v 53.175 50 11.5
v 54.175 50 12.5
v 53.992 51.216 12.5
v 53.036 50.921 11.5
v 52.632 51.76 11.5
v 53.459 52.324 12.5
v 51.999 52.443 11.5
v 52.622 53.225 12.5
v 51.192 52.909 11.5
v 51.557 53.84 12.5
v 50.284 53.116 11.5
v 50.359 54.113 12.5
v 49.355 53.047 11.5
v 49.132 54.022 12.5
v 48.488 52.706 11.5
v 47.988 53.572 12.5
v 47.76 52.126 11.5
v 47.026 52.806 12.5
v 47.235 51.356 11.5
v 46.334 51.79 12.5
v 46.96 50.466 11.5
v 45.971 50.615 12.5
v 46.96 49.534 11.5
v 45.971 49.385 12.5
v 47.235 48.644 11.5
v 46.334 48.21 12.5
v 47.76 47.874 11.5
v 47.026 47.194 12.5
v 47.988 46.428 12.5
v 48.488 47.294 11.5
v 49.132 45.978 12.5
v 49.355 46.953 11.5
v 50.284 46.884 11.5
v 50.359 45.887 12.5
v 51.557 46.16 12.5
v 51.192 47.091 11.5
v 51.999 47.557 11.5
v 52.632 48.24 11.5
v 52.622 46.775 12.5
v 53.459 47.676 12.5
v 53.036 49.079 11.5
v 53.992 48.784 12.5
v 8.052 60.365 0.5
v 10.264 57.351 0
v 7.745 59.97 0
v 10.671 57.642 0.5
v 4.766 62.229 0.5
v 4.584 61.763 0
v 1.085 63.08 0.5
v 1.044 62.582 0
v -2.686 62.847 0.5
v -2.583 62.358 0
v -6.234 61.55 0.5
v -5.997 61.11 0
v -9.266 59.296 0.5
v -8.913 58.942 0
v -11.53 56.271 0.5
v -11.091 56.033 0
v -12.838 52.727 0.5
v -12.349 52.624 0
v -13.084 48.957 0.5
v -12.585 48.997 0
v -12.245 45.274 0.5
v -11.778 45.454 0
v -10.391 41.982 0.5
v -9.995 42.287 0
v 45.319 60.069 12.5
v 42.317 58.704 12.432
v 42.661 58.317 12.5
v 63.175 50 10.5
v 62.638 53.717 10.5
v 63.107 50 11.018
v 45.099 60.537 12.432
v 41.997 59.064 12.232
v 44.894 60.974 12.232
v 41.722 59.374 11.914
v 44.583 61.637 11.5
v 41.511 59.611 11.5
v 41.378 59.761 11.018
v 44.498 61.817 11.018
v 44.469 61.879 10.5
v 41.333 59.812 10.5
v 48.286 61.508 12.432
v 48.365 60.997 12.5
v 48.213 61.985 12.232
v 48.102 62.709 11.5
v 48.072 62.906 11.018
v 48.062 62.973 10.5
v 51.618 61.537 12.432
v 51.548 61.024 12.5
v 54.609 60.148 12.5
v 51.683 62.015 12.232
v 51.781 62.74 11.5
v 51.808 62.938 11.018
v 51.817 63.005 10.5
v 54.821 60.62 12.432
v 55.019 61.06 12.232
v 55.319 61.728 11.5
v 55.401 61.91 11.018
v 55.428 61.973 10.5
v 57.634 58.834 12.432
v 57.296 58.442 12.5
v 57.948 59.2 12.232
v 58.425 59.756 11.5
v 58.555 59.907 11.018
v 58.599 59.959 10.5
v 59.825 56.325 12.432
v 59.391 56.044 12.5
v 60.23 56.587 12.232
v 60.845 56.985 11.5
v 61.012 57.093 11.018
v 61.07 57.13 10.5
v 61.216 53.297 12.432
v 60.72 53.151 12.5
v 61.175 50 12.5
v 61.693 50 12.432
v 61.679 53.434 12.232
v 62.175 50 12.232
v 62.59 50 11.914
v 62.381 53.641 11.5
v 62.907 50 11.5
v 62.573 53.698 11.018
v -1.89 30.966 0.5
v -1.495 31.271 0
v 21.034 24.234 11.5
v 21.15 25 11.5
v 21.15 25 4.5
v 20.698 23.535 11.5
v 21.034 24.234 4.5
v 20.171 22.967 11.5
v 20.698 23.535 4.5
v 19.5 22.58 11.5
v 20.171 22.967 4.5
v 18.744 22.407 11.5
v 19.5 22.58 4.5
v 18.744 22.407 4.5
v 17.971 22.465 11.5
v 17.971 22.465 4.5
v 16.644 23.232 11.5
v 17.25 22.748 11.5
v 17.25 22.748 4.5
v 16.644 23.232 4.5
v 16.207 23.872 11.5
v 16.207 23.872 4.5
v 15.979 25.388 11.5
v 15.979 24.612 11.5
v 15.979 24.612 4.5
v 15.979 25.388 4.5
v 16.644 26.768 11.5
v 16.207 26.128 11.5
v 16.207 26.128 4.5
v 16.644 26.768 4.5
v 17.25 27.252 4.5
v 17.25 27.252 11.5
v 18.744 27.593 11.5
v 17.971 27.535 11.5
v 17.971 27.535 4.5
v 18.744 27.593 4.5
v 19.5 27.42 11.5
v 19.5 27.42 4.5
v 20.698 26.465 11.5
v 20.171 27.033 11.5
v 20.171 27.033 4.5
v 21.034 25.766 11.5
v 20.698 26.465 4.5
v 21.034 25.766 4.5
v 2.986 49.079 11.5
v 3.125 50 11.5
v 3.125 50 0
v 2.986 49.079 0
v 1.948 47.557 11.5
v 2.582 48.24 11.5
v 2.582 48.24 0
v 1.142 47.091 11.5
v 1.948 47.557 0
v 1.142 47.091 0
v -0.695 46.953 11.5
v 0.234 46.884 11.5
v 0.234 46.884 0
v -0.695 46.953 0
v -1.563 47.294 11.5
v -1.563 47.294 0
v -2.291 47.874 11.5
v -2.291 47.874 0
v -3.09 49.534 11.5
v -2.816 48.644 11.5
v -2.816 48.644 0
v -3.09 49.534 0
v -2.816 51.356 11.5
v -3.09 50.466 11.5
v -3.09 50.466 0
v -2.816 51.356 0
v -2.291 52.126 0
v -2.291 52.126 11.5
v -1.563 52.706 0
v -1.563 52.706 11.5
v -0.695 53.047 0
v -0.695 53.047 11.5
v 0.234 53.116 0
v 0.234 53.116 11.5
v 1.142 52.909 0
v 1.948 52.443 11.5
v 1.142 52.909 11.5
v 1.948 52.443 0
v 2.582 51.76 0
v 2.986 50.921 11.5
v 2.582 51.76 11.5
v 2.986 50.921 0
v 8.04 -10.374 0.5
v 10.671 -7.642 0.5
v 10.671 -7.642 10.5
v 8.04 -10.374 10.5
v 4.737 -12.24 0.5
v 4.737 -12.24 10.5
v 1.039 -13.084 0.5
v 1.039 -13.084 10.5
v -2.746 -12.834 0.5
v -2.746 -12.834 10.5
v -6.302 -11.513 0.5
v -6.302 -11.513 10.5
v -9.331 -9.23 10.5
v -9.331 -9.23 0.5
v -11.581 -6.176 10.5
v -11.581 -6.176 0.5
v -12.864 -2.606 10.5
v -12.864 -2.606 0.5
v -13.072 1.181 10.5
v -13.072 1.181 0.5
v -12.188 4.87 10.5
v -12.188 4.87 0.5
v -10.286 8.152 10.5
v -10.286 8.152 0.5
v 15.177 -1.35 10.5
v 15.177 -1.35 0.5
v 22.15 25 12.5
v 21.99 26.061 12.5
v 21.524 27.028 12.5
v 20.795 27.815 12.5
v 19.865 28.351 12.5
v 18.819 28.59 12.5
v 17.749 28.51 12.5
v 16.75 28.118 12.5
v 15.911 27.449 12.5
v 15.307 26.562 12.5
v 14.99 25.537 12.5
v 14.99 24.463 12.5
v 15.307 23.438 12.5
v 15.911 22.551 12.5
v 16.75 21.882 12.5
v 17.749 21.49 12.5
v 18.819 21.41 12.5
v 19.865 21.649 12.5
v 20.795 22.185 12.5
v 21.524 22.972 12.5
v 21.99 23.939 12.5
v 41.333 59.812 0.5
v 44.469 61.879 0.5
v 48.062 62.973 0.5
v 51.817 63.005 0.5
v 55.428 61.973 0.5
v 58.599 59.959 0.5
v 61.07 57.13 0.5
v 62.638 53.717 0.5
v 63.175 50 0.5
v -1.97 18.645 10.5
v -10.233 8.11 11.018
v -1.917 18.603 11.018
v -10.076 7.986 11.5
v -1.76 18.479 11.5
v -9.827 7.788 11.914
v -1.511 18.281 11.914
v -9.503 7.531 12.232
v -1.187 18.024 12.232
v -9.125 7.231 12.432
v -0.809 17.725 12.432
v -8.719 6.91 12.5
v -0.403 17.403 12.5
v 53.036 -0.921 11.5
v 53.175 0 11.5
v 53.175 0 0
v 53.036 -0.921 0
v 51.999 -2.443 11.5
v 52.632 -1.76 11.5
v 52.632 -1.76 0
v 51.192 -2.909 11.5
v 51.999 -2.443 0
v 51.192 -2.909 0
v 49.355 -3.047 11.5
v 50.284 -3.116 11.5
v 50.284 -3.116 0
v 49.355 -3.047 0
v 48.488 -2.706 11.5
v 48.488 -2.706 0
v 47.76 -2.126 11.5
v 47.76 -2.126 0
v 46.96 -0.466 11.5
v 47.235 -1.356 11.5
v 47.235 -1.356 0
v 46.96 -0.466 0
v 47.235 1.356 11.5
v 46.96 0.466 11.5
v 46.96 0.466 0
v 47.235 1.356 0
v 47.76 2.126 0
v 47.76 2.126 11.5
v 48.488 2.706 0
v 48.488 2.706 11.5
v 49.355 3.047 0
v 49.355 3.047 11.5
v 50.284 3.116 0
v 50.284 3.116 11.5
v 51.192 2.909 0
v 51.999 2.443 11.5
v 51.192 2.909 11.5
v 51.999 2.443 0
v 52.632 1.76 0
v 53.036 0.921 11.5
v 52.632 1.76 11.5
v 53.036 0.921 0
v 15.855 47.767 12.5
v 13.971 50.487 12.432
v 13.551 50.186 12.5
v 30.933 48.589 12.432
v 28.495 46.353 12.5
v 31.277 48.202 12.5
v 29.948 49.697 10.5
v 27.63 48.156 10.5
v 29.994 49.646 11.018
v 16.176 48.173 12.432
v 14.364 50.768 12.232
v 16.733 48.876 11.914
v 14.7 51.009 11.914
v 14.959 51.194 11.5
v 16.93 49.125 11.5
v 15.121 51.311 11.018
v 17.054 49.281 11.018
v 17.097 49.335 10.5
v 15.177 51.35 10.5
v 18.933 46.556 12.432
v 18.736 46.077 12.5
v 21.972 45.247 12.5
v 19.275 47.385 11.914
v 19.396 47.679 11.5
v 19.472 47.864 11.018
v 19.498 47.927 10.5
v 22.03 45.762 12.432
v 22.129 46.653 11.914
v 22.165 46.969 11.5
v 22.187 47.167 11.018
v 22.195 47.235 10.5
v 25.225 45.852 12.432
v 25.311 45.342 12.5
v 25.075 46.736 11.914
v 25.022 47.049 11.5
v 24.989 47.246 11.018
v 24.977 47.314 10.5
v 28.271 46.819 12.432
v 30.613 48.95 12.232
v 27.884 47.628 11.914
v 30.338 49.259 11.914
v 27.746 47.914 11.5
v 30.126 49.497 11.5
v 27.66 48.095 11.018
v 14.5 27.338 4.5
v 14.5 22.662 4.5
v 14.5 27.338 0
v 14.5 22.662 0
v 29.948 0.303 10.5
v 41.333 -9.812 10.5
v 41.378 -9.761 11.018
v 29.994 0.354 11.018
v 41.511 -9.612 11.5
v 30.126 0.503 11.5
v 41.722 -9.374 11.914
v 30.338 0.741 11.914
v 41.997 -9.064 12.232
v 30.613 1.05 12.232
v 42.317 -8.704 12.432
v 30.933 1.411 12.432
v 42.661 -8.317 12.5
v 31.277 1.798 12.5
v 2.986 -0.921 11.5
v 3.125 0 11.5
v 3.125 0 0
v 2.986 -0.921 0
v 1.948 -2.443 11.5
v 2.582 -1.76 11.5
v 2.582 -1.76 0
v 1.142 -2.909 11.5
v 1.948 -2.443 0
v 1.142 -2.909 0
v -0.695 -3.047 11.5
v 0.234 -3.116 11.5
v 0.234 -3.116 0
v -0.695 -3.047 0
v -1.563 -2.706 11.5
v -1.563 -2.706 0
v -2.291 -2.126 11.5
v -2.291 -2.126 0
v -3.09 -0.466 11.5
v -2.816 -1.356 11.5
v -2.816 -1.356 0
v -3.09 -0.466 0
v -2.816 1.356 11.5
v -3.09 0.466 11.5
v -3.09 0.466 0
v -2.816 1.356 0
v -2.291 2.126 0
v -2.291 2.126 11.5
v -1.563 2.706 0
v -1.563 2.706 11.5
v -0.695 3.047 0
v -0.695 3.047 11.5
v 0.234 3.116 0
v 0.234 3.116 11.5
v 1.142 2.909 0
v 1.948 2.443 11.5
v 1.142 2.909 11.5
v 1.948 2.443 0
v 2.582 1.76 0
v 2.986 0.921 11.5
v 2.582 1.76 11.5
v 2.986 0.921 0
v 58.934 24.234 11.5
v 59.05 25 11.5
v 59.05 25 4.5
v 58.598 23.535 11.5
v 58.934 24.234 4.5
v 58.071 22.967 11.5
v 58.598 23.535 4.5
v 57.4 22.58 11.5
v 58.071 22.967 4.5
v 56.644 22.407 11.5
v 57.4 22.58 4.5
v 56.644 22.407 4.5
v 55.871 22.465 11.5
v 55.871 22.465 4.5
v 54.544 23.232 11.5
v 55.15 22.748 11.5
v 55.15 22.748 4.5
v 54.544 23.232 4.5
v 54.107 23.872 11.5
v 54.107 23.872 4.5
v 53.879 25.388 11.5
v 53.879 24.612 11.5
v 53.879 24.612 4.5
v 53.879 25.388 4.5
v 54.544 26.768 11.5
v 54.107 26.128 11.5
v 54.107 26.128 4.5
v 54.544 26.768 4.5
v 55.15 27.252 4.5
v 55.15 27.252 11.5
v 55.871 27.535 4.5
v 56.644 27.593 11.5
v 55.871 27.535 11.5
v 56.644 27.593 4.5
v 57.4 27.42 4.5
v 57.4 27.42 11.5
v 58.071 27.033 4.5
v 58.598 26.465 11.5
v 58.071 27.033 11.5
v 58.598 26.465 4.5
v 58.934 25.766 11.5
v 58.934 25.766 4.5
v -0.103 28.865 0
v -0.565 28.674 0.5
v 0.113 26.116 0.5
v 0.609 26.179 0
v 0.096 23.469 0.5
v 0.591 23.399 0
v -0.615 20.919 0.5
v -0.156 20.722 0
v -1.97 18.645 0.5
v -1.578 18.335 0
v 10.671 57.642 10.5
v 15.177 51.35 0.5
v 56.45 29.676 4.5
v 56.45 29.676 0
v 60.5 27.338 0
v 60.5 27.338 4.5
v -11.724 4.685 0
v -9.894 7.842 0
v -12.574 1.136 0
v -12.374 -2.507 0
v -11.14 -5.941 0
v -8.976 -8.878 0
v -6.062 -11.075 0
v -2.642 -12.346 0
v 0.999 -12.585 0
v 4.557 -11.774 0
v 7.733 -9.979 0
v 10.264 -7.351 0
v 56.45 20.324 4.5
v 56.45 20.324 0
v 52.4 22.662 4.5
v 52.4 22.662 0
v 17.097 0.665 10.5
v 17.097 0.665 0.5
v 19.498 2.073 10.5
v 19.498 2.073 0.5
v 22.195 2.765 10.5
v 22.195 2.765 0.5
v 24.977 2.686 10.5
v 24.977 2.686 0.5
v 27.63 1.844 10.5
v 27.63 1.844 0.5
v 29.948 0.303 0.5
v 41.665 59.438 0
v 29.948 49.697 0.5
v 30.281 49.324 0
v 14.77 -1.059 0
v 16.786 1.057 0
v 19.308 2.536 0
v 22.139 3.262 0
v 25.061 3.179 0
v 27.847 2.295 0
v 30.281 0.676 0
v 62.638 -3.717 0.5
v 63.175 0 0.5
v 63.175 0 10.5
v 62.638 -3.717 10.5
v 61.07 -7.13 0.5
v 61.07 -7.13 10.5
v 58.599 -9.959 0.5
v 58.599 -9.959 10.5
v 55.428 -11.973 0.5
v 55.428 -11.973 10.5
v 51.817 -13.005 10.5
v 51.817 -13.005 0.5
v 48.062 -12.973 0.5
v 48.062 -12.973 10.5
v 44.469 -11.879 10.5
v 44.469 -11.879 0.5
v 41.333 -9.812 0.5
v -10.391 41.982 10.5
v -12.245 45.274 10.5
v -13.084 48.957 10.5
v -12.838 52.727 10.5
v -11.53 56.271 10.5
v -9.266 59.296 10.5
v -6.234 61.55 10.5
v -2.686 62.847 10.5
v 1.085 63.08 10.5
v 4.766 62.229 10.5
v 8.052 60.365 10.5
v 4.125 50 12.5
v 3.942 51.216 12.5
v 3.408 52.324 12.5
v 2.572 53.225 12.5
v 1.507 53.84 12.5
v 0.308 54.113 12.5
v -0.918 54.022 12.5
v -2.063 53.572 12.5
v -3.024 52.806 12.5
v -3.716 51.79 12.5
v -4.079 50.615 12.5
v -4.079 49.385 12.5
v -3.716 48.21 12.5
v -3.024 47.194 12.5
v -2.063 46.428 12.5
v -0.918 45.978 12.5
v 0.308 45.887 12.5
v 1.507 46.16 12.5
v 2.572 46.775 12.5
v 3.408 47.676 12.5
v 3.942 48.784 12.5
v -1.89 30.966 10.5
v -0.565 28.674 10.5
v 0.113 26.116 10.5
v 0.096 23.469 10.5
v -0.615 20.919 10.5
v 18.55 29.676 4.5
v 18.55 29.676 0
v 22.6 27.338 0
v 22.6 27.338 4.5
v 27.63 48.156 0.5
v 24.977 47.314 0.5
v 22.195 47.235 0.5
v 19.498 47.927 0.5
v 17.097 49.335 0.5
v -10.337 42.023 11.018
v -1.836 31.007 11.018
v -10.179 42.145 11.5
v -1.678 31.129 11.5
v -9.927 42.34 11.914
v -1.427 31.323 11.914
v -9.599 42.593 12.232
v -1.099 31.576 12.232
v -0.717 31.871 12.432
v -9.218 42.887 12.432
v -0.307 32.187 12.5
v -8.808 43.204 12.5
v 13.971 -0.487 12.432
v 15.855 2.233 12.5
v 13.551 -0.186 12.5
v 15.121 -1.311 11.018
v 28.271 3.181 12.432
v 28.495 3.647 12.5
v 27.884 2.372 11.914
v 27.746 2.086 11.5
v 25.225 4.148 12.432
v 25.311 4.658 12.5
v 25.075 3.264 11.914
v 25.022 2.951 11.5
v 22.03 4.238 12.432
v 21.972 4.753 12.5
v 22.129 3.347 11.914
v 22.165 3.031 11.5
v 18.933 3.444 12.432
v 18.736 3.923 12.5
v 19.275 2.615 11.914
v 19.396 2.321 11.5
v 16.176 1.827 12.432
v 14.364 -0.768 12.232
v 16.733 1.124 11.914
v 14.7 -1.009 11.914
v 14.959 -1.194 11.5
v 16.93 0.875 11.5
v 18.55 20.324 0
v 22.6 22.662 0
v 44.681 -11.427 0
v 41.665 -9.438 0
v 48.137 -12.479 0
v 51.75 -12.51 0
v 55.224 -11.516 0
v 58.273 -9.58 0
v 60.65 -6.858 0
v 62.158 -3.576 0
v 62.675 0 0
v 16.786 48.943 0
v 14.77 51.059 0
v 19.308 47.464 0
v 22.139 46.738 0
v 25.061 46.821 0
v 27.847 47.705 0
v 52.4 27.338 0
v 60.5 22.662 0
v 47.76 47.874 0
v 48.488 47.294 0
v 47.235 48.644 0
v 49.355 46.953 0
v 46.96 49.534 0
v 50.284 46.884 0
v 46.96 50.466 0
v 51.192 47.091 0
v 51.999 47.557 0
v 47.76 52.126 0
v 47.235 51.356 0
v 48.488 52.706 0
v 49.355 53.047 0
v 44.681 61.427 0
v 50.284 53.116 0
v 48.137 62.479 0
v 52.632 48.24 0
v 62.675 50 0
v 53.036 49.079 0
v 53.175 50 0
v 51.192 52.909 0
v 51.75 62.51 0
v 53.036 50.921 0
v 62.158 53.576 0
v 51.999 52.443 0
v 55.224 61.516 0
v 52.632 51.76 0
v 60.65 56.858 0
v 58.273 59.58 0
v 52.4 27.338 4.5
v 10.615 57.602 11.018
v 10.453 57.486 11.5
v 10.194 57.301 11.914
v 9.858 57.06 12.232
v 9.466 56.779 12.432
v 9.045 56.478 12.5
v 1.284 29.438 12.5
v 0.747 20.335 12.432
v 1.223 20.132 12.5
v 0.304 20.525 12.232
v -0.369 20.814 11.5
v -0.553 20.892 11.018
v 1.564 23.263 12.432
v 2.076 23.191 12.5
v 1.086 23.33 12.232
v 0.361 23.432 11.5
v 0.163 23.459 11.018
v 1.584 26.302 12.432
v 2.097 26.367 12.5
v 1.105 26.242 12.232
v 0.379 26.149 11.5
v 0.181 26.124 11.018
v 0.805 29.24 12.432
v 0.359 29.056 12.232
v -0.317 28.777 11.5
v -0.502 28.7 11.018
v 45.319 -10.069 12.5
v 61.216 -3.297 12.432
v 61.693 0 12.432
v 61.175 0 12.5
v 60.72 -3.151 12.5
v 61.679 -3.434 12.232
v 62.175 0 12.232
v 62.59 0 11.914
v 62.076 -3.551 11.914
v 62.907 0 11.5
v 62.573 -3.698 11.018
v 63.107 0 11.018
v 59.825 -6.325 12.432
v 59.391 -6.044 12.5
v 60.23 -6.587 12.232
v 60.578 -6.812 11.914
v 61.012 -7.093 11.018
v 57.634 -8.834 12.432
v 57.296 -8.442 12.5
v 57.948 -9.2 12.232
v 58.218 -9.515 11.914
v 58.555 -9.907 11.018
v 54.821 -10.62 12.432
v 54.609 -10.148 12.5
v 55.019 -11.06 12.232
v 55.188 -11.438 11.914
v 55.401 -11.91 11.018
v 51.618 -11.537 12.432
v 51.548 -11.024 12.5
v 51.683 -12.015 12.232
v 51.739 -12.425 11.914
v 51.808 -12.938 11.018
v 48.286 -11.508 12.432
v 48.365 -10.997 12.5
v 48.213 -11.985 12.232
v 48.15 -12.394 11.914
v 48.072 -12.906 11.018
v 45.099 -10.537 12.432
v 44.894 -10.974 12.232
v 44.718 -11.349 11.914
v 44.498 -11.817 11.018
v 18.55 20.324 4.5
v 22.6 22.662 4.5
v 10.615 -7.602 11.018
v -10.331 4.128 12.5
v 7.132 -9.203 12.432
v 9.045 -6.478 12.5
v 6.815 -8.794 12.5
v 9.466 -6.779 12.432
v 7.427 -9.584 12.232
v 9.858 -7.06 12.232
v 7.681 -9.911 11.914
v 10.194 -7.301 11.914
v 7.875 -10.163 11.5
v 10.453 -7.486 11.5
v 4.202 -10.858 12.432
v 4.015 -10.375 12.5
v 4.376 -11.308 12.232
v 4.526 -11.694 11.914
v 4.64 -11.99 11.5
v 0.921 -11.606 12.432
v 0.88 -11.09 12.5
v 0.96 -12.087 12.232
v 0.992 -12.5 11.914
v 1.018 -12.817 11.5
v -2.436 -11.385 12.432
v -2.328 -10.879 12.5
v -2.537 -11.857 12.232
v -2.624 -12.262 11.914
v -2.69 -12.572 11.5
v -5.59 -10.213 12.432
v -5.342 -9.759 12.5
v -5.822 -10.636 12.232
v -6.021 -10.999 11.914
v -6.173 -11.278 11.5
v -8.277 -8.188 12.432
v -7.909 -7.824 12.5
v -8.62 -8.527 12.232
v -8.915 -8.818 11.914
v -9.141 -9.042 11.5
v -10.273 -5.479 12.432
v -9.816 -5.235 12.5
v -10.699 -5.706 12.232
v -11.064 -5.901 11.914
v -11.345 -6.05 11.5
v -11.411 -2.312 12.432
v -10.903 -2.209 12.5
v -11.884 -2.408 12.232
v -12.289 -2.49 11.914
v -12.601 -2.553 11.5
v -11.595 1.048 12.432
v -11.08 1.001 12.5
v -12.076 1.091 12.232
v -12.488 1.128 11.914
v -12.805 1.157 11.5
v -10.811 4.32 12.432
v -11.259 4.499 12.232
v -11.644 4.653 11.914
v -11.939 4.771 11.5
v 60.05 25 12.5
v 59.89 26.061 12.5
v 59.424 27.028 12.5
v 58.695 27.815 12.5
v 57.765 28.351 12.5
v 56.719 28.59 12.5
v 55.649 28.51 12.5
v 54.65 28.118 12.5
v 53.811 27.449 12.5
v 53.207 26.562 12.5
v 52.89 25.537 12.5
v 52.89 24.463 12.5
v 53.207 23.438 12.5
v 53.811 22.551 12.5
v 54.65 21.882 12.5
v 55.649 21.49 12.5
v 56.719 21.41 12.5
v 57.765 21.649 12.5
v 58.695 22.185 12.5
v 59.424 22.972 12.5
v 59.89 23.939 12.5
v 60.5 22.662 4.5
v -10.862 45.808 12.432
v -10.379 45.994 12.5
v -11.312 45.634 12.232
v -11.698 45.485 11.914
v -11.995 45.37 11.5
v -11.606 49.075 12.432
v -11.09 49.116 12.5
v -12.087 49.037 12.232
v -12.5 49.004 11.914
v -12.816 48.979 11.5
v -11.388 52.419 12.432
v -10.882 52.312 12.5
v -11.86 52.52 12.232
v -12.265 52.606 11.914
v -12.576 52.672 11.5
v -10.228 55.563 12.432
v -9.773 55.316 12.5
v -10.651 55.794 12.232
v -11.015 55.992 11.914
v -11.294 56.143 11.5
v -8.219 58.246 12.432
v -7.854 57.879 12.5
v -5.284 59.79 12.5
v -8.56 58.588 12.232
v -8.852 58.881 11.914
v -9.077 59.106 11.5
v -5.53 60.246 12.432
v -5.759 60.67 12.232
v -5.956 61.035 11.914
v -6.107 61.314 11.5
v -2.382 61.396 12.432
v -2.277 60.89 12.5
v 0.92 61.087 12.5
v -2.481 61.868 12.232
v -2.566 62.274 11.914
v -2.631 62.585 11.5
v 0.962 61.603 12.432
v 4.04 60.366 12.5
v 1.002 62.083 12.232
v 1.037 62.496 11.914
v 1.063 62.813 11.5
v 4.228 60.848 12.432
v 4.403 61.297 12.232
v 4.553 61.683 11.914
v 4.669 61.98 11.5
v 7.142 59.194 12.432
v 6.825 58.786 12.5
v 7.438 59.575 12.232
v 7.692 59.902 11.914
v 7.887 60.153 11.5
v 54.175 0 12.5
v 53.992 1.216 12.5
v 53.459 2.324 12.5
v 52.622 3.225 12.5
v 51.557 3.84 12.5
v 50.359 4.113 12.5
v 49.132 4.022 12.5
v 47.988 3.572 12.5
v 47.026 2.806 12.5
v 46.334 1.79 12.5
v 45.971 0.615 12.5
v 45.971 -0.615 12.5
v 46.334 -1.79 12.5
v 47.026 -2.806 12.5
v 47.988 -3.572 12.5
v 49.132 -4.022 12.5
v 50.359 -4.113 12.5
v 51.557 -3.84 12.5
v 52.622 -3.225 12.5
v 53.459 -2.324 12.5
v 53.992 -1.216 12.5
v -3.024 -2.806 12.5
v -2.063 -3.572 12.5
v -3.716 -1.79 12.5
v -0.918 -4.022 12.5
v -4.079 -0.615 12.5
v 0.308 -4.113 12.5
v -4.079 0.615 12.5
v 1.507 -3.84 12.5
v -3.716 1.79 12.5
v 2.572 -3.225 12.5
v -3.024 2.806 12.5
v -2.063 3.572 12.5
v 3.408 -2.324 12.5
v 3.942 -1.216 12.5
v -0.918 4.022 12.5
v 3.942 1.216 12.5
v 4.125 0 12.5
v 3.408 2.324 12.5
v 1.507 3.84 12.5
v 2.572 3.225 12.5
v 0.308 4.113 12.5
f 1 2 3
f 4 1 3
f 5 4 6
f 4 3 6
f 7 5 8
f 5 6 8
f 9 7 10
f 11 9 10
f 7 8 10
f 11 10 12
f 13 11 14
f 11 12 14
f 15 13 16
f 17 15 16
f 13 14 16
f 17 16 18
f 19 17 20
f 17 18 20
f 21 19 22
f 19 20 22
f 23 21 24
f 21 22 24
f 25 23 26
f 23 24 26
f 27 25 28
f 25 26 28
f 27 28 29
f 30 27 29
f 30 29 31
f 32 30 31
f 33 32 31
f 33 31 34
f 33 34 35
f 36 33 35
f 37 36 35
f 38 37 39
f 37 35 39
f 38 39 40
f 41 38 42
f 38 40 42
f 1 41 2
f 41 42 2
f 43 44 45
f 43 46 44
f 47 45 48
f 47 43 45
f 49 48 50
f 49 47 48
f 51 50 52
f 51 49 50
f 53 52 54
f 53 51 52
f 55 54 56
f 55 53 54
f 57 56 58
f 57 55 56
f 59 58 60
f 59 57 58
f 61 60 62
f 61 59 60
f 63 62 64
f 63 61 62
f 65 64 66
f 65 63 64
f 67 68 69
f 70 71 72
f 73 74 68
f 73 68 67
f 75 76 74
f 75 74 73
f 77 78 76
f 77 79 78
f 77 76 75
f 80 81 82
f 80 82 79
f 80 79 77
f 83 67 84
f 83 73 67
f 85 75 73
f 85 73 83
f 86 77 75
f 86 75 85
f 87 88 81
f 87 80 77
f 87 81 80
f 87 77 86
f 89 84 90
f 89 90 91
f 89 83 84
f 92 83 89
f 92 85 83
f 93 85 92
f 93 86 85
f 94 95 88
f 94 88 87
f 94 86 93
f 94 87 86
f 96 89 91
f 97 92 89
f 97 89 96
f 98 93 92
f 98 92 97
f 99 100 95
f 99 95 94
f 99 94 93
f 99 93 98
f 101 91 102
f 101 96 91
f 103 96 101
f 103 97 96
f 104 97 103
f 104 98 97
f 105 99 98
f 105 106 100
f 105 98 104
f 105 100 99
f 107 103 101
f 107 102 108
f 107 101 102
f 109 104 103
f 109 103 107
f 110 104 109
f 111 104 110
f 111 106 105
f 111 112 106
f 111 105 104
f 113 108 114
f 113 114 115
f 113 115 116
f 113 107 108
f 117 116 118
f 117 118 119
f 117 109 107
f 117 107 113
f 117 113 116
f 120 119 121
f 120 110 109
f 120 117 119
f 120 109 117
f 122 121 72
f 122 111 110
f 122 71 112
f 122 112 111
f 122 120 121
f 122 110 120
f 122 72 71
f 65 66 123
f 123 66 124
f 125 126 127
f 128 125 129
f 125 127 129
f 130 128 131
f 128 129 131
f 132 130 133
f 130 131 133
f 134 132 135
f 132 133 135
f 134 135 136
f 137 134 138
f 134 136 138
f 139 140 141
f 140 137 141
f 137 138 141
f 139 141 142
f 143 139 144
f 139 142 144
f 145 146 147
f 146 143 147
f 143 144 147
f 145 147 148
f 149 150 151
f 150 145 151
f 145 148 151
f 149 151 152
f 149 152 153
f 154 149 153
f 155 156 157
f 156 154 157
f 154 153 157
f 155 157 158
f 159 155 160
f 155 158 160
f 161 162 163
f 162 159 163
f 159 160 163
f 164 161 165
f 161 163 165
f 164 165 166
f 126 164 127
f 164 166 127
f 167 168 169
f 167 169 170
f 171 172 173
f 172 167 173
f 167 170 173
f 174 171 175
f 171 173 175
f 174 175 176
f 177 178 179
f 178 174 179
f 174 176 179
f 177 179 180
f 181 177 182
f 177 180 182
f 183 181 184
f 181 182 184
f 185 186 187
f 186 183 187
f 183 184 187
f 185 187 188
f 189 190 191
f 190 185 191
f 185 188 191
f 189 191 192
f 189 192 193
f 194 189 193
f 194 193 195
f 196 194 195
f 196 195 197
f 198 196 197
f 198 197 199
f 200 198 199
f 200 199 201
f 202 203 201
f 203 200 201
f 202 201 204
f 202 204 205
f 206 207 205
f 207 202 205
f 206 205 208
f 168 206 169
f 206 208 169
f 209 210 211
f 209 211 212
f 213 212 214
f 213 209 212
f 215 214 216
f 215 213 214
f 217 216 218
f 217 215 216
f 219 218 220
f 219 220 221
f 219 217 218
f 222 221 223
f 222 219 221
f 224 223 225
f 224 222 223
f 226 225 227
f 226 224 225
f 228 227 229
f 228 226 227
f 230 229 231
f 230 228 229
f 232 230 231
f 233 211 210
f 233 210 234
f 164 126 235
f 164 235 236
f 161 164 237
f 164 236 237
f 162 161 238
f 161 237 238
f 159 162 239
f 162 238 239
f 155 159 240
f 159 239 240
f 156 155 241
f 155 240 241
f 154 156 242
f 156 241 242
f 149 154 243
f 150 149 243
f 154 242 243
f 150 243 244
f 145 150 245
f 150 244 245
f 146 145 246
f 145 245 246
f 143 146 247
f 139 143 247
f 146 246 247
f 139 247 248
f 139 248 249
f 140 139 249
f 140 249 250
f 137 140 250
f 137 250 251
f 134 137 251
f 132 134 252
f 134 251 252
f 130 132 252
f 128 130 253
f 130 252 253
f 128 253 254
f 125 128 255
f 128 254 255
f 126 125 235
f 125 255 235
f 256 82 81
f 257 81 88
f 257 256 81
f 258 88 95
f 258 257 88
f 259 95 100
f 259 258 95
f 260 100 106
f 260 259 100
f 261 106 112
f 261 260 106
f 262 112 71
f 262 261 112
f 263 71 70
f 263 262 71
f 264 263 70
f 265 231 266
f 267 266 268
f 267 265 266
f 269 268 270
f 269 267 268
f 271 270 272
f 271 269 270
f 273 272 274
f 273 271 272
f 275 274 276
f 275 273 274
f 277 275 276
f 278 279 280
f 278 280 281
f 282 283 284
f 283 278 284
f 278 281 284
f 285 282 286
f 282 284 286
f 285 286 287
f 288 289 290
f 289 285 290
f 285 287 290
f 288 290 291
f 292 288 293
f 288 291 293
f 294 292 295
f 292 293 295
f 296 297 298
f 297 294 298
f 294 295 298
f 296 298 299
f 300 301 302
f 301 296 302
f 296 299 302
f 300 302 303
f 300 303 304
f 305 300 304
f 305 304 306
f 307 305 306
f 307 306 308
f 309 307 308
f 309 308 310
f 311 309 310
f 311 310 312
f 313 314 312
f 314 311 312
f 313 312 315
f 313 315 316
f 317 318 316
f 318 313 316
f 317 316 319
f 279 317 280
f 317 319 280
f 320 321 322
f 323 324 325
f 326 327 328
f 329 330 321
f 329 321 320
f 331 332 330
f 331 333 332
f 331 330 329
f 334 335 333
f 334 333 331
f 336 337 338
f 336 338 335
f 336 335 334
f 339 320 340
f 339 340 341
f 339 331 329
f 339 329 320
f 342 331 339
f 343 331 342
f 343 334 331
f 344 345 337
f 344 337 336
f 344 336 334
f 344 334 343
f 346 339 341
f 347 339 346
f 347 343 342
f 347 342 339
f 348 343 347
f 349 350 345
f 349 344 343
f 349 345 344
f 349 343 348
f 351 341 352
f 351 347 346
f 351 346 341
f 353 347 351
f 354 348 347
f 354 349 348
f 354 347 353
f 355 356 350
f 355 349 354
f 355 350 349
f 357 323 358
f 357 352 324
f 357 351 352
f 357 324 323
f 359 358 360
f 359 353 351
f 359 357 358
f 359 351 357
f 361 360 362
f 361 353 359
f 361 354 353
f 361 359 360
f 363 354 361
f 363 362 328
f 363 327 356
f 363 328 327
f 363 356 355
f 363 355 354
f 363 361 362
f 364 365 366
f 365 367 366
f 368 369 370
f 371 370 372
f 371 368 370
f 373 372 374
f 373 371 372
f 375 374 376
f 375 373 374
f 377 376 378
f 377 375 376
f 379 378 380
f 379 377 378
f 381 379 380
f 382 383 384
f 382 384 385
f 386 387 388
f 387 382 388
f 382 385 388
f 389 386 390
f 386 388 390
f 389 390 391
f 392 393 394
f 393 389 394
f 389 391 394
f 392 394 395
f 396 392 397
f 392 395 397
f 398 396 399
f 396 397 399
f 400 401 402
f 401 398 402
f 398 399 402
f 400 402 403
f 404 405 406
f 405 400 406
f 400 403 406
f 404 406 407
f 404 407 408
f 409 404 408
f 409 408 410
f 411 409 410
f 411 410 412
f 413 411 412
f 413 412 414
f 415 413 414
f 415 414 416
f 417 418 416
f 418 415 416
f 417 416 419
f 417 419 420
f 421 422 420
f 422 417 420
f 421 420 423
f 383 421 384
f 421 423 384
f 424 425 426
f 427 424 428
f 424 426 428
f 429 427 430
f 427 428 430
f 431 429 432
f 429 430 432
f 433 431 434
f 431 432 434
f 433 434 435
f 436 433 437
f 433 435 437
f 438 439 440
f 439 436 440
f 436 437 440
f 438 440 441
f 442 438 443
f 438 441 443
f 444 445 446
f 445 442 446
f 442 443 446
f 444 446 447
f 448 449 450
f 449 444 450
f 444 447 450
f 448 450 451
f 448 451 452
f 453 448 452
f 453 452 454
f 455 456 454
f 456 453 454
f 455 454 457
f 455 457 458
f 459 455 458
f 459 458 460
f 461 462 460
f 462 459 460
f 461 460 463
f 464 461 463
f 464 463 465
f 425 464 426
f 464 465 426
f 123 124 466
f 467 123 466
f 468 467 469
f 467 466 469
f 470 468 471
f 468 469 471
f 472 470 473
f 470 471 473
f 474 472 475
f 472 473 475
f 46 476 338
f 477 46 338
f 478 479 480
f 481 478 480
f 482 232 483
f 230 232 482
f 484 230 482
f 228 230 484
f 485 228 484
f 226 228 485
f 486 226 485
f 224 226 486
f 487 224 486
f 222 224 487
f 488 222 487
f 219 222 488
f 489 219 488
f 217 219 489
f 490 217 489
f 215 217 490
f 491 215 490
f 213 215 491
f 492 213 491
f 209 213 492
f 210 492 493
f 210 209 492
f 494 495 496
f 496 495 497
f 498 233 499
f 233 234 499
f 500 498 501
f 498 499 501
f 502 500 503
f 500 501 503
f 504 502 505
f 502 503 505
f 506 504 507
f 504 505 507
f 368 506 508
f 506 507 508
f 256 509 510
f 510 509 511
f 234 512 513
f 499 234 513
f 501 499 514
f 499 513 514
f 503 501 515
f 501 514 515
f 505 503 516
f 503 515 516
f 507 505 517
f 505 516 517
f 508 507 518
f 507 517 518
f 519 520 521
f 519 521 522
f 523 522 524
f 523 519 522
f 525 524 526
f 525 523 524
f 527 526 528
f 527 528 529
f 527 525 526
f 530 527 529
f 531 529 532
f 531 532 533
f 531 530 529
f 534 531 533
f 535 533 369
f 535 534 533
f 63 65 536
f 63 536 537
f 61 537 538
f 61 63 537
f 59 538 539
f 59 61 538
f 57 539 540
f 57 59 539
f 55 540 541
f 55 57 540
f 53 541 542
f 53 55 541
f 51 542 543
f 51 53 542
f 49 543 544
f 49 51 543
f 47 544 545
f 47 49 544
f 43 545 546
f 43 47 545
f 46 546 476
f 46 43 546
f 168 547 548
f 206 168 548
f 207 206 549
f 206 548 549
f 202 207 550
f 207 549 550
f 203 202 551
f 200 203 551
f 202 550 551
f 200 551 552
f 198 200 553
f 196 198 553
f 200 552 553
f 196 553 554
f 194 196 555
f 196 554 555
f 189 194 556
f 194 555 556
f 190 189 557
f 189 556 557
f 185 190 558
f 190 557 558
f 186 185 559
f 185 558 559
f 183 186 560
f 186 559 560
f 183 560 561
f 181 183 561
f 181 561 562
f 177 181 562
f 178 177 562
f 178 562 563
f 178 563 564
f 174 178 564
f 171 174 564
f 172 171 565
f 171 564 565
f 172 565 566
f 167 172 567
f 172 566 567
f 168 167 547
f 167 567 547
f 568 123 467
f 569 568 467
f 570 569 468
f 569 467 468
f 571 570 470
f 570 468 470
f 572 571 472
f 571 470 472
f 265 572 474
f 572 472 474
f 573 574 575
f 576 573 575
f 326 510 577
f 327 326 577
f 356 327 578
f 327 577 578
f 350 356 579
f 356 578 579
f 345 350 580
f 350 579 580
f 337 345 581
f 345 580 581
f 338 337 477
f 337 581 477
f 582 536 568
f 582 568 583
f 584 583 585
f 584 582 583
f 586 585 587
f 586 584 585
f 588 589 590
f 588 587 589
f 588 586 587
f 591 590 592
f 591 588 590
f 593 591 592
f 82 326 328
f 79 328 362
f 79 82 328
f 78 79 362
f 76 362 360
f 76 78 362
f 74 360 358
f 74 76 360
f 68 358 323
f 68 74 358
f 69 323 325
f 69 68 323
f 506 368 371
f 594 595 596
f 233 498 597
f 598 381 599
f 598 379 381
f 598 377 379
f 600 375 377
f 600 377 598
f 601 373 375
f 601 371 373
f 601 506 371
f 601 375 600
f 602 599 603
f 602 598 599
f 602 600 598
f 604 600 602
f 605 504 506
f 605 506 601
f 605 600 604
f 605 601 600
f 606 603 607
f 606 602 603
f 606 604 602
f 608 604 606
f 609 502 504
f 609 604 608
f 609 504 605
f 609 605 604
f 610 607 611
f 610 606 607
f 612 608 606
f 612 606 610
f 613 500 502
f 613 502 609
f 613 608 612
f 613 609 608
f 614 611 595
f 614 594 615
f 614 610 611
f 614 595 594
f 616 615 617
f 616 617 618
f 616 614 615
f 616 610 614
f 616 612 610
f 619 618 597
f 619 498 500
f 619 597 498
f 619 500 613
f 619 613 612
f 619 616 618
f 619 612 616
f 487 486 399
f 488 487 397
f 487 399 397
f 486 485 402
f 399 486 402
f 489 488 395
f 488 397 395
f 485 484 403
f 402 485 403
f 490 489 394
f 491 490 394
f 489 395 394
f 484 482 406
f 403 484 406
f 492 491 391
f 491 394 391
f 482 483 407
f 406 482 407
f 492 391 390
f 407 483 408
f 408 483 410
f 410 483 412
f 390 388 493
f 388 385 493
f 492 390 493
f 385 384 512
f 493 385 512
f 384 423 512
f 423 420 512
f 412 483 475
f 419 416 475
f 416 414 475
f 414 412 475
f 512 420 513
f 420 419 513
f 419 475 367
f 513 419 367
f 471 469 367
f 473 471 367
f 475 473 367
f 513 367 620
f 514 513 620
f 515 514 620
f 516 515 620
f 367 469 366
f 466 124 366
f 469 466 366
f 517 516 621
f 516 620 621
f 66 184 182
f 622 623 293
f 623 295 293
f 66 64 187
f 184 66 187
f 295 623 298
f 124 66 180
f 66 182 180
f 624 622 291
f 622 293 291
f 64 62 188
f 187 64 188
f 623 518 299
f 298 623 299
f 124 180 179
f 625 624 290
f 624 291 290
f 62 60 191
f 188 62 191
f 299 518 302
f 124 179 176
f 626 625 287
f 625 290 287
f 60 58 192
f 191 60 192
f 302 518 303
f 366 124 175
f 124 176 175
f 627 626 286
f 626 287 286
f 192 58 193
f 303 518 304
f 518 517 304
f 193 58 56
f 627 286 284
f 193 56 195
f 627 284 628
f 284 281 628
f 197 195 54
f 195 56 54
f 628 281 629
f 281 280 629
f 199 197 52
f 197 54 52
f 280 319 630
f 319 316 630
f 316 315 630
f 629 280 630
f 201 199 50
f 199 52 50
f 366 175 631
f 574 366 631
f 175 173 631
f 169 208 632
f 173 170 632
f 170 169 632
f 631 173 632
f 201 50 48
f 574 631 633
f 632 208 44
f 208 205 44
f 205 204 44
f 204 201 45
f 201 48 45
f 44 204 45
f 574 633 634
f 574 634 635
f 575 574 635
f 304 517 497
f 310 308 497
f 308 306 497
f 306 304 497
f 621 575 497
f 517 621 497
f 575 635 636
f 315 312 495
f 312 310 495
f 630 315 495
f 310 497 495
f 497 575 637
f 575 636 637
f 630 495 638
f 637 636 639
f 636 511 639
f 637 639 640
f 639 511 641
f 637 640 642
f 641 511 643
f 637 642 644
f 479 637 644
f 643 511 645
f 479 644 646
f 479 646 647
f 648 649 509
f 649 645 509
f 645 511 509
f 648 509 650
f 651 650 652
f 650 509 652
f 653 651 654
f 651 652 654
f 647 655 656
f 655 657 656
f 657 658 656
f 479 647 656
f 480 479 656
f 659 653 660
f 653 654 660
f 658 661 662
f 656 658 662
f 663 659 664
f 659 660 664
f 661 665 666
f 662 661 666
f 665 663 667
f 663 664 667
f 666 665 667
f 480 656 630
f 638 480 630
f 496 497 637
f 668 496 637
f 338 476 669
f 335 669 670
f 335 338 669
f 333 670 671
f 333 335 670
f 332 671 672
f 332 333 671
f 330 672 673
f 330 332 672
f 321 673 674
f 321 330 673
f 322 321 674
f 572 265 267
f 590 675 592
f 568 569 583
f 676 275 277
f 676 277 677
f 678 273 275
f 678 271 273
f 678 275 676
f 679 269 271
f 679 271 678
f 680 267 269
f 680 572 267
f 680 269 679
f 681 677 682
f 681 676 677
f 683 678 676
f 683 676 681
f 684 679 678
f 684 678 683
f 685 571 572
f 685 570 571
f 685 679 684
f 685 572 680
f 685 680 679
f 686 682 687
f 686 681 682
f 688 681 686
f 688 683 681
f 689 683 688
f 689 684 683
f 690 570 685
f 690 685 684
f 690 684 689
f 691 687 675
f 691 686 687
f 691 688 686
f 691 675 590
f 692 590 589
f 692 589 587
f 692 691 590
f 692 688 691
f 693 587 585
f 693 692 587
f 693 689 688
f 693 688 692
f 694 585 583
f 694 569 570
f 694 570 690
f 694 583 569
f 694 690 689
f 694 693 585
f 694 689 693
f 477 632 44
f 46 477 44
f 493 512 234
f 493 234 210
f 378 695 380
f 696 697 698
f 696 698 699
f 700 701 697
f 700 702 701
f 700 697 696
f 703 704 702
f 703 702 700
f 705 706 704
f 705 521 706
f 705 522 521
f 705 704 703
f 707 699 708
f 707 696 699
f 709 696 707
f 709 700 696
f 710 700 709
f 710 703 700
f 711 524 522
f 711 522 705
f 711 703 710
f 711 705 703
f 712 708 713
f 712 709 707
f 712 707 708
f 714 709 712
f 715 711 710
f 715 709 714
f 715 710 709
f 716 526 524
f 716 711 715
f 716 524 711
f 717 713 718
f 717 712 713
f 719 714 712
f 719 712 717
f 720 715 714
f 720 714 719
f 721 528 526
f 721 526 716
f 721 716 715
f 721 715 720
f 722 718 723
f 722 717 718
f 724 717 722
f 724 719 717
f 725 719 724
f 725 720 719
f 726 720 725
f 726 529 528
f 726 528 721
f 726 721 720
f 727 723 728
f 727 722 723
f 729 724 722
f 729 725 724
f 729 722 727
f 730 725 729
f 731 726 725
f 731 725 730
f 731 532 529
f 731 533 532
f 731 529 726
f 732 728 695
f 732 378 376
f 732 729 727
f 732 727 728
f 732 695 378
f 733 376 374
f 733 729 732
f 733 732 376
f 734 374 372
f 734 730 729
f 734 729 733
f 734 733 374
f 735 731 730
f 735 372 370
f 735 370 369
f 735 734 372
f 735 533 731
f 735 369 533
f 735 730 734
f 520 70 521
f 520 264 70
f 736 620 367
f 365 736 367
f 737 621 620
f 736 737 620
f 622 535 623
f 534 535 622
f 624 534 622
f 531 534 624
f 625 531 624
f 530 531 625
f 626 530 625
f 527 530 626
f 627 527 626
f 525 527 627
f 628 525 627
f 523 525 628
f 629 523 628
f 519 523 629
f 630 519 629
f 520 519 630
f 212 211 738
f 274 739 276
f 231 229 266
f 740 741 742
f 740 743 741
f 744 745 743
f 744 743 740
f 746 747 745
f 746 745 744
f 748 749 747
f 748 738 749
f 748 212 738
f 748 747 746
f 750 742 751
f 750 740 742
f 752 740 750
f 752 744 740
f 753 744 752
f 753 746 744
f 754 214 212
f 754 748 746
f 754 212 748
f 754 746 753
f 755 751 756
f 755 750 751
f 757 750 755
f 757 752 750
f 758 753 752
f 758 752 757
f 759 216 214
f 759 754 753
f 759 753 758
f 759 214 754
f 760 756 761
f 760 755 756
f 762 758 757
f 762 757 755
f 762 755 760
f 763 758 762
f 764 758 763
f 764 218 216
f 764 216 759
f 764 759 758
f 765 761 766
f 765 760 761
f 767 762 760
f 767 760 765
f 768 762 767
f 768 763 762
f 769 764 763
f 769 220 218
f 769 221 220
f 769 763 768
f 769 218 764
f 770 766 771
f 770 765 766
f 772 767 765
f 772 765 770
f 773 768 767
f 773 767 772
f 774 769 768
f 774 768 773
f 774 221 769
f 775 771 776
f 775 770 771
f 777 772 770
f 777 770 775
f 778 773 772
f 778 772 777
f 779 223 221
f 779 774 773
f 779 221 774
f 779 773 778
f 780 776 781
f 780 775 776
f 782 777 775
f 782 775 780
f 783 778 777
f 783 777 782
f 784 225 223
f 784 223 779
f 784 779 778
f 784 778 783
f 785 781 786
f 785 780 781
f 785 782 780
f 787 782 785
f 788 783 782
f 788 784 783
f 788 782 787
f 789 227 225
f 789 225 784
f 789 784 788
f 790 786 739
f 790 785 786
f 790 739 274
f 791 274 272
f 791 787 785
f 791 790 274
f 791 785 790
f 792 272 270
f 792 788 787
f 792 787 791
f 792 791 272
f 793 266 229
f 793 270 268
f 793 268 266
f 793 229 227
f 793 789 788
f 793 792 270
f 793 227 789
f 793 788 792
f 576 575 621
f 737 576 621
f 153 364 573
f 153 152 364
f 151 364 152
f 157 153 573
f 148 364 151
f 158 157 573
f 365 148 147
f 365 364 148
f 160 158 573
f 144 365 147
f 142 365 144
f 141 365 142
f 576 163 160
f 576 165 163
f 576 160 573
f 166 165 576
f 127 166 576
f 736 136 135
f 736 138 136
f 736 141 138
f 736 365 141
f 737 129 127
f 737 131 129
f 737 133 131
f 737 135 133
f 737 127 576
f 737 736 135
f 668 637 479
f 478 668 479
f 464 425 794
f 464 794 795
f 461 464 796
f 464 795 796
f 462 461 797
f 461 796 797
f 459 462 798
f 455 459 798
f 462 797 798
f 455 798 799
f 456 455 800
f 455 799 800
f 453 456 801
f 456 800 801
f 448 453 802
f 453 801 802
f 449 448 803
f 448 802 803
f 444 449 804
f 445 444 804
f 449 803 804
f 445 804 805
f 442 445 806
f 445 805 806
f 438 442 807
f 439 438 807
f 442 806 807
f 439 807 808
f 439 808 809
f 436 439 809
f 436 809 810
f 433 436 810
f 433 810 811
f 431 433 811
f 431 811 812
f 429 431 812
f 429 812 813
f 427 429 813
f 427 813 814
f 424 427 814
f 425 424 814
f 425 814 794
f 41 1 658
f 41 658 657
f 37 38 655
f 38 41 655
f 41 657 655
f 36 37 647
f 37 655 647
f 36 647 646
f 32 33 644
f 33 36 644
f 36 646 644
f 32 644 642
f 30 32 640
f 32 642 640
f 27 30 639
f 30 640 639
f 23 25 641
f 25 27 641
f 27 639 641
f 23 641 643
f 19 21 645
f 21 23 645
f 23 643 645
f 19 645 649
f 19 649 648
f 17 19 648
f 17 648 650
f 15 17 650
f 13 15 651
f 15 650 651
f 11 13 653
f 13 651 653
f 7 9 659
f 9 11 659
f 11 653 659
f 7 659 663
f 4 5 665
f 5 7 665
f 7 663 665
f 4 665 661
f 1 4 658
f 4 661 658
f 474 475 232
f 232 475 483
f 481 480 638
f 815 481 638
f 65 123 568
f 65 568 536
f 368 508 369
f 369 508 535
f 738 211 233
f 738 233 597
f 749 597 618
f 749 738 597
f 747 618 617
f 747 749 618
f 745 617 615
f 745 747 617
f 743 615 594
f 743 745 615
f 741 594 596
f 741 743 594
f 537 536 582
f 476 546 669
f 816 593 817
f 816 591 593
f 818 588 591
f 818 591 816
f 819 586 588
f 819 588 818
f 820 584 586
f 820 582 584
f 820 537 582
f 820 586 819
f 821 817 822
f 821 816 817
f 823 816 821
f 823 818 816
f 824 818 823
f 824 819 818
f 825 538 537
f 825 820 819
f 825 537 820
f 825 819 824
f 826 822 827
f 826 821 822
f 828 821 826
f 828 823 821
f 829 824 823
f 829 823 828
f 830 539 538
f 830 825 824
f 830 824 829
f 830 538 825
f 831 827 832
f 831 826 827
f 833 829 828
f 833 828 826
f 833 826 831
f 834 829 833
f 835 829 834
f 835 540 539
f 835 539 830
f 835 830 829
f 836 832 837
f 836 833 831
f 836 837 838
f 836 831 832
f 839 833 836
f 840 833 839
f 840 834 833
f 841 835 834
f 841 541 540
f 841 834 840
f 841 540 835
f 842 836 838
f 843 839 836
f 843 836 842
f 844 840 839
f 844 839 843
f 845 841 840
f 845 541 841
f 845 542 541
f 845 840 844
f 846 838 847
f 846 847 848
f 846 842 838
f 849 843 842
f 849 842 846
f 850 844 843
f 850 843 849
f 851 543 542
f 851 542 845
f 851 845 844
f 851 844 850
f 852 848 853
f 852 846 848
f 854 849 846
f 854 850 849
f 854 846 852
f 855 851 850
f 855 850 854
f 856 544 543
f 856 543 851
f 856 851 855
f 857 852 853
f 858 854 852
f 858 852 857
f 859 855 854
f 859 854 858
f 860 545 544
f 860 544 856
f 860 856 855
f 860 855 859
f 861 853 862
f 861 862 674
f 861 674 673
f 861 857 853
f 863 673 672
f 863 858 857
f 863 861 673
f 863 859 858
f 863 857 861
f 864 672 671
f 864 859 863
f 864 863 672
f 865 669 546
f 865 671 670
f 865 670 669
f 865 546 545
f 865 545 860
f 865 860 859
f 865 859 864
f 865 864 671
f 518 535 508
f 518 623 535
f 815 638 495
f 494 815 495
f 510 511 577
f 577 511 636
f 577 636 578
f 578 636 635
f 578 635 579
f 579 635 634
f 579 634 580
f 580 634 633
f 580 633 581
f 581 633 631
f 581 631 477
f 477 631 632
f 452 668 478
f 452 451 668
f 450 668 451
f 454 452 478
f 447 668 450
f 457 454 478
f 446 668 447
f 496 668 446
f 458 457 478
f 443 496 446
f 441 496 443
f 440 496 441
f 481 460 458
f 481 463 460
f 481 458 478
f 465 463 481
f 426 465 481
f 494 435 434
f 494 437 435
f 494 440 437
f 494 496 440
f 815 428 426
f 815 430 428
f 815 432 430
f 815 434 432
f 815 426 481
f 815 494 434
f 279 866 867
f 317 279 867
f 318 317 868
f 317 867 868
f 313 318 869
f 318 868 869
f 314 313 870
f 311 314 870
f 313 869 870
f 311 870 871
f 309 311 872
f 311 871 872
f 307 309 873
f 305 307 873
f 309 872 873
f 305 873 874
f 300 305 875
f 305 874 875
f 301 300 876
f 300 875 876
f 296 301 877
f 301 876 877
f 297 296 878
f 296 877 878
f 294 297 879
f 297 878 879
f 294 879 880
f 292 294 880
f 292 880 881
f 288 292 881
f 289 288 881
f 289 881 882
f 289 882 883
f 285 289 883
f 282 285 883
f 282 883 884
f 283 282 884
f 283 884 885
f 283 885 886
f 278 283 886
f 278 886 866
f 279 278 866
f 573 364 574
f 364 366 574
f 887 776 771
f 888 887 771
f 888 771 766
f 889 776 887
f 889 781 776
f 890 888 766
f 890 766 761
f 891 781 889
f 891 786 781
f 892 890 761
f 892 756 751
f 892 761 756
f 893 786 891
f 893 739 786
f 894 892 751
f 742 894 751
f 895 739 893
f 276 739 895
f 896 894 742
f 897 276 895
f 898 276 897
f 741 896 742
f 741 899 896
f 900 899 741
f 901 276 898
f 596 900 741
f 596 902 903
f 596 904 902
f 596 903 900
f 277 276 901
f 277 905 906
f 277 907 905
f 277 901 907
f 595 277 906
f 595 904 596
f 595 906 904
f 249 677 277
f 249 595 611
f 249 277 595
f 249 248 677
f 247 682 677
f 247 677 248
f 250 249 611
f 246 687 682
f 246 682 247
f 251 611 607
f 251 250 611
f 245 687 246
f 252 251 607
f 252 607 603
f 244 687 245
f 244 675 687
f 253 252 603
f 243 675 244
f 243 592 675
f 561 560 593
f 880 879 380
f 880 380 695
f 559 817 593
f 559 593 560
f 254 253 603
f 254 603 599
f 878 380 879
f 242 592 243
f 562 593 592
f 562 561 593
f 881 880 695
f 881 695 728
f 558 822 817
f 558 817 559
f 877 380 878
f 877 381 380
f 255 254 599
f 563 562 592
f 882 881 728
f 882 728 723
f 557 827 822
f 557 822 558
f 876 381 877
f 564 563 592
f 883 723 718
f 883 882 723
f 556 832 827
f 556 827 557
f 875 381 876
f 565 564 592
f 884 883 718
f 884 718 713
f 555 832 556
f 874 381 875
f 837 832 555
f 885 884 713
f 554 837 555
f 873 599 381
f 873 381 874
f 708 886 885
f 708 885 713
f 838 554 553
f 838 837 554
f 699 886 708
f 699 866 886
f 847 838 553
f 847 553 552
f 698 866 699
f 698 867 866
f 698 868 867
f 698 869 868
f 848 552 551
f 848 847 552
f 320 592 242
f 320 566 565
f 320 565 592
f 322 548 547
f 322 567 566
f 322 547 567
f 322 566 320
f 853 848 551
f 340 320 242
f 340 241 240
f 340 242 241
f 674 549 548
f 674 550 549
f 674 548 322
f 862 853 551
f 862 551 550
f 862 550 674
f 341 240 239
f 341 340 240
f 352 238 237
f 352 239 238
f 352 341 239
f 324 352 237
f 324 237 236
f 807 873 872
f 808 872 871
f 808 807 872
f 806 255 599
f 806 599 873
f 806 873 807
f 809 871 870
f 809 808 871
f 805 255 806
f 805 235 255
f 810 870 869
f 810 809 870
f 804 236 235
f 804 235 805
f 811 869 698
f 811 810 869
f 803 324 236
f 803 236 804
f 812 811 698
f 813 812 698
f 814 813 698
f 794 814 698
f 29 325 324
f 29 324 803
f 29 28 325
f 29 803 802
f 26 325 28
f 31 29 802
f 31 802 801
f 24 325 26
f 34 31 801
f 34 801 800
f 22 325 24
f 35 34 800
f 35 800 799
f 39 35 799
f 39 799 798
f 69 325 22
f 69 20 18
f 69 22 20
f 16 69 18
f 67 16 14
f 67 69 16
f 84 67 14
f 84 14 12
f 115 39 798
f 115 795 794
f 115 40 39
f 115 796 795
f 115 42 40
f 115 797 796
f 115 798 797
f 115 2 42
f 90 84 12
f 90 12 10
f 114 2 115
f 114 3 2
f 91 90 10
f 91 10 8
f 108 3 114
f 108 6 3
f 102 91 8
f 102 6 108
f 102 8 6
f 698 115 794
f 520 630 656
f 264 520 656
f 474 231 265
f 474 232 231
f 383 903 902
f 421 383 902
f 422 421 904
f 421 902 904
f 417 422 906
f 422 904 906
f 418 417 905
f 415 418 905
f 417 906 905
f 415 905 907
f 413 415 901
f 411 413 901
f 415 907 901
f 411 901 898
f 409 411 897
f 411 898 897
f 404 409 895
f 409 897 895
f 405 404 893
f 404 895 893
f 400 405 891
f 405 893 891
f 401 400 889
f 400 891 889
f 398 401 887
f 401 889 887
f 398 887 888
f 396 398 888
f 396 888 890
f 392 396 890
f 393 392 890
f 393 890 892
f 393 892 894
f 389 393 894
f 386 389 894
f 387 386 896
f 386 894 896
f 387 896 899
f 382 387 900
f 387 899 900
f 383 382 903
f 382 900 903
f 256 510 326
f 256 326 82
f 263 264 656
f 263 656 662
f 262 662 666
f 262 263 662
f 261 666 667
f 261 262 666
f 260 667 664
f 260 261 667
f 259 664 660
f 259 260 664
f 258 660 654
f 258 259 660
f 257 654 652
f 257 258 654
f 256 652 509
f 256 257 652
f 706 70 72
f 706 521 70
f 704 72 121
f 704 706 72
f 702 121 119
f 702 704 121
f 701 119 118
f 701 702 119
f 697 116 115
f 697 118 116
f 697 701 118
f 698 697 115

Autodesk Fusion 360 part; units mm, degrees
sketch "Sketch1" plane through (0, 0, 0) normal (0, 0, 1) x (1, 0, 0)
  circle A0 centre (0, 0) radius 3.125
  circle A1 centre (0, 50) radius 3.125
  circle A2 centre (0, 0) radius 13.125
  circle A3 centre (0, 50) radius 13.125
  line L0 (0, 50) -> (0, 0) construction
  line L1 (37.5, 50.1021) -> (37.5, 0.1021) construction
  line L2 (0, 25) -> (18.55, 25) construction
  circle A4 centre (18.55, 25) radius 2.6
  circle A5 centre (18.55, 25) radius 12.6 construction
  line L3 (-10.2863, 8.1521) -> (-1.9703, 18.6453)
  line L4 (-1.8904, 30.9655) -> (-10.3911, 41.9818)
  arc A6 (-1.9703, 18.6453) -> (-1.8904, 30.9655) centre (-9.8074, 24.8564) ccw
  line L5 (75, 25) -> (56.45, 25) construction
  circle A7 centre (56.45, 25) radius 2.6
  circle A8 centre (56.45, 25) radius 12.6 construction
  line L6 (10.6707, 57.6421) -> (15.1766, 51.3504)
  line L7 (50, 25) -> (50, 37.5) construction
  line L8 (0, 0) -> (37.5, 0) construction
  line L9 (18.55, 25) -> (56.45, 25) construction
  line L10 (37.5, 25) -> (37.5, 37.5) construction
  circle A9 centre (50.0503, 50) radius 13.125
  circle A10 centre (50.0503, 50) radius 3.125
  circle A11 centre (50.0503, 0) radius 13.125
  circle A12 centre (50.0503, 0) radius 3.125
  line L11 (29.9485, 49.6973) -> (41.3329, 59.8118)
  line L12 (21.6444, 42.3194) -> (21.6444, 45)
  line L13 (0, 50) -> (50.0503, 50) construction
  arc A13 (15.1766, 51.3504) -> (29.9485, 49.6973) centre (23.3067, 57.173) ccw
  line L14 (63.1753, 50) -> (63.1753, 0)
  line L15 (56.45, 25) -> (61.45, 25) construction
  arc A14 (29.9485, 0.3027) -> (15.1766, -1.3504) centre (23.3067, -7.173) ccw
  line L16 (10.6707, -7.6421) -> (15.1766, -1.3504)
  line L17 (29.9485, 0.3027) -> (41.3329, -9.8118)
  point P0 (5.95, 25)
  dimension "d156" = 6.25
  dimension "d159" = 25
  dimension "d160" = 25
  dimension "d161" = 10
  dimension "d162" = 10
  dimension "d163" = 50
  dimension "d165" = 50
  dimension "d166" = 18.55
  dimension "d167" = 5.2
  dimension "d168" = 10
  dimension "d169" = 10
  dimension "d178" = 37.5
  dimension "d5" = 25
  dimension "d6" = 25
  dimension "d7" = 10
  dimension "d8" = 10
  dimension "d9" = 6.25
  dimension "d10" = 50
  dimension "d11" = 10
  dimension "d12" = 5
extrude "Extrude1" add sketch "Sketch1" along normal blind 12.5
chamfer "Chamfer1" distance 1 angle 45 6 edges at (-2.9135, 51.13, 12.5) (47.1368, 51.13, 12.5) (54.0259, 25.9402, 12.5) (16.1259, 25.9402, 12.5) (47.1368, 1.13, 12.5) (-2.9135, 1.13, 12.5)
fillet "Fillet1" radius 2 14 edges at (12.9237, 54.4962, 12.5) (-7.8314, 60.5326, 12.5) (-6.1408, 36.4737, 12.5) (0.1923, 24.7916, 12.5) (-6.1283, 13.3987, 12.5) (-7.8994, -10.4816, 12.5) (12.9237, -4.4962, 12.5) (22.1945, 2.765, 12.5) (35.6407, -4.7546, 12.5) (55.4285, -11.9725, 12.5) (63.1753, 25, 12.5) (22.1945, 47.235, 12.5) (35.6407, 54.7546, 12.5) (55.4285, 61.9725, 12.5)
sketch "Sketch2" plane through (0, 0, 0) normal (0, 0, -1) x (1, 0, 0)
  circle A0 centre (0, 0) radius 3.125
  line L0 (22.6, -22.6617) -> (18.55, -20.3235)
  line L1 (18.55, -20.3235) -> (14.5, -22.6617)
  line L2 (14.5, -22.6617) -> (14.5, -27.3383)
  line L3 (14.5, -27.3383) -> (18.55, -29.6765)
  line L4 (18.55, -29.6765) -> (22.6, -27.3383)
  line L5 (22.6, -27.3383) -> (22.6, -22.6617)
  circle A1 centre (50.0503, 0) radius 3.125
  circle A2 centre (0, -50) radius 3.125
  circle A3 centre (56.45, -25) radius 2.6
  circle A4 centre (50.0503, -50) radius 3.125
  circle A5 centre (18.55, -25) radius 2.6
  arc A6 (10.6707, 7.6421) -> (-10.2863, -8.1521) centre (0, 0) ccw
  line L6 (-10.2863, -8.1521) -> (-1.9703, -18.6453)
  arc A7 (-1.8904, -30.9655) -> (-1.9703, -18.6453) centre (-9.8074, -24.8564) ccw
  line L7 (-1.8904, -30.9655) -> (-10.3911, -41.9818)
  arc A8 (-10.3911, -41.9818) -> (10.6707, -57.6421) centre (0, -50) ccw
  line L8 (10.6707, -57.6421) -> (15.1766, -51.3504)
  arc A9 (29.9485, -49.6973) -> (15.1766, -51.3504) centre (23.3067, -57.173) ccw
  line L9 (29.9485, -49.6973) -> (41.3329, -59.8118)
  arc A10 (41.3329, -59.8118) -> (63.1753, -50) centre (50.0503, -50) ccw
  line L10 (63.1753, -50) -> (63.1753, 0)
  arc A11 (63.1753, 0) -> (41.3329, 9.8118) centre (50.0503, 0) ccw
  line L11 (41.3329, 9.8118) -> (29.9485, -0.3027)
  arc A12 (15.1766, 1.3504) -> (29.9485, -0.3027) centre (23.3067, 7.173) ccw
  line L12 (15.1766, 1.3504) -> (10.6707, 7.6421)
  point P0 (18.55, -25)
  dimension "d194" = 4.05
extrude "Extrude2" cut sketch "Sketch2" against normal blind 4.5 contours L0 L1 L2 L3 L4 L5
ref_plane "WorkPlane2" through (37.5, 0, 0) normal (1, 0, 0) x (0, 1, 0)
mirror "Mirror5" about plane through (37.5, 0, 0) normal (1, 0, 0) of "Extrude2"
chamfer "Chamfer2" distance 0.5 angle 45 14 edges at (55.4285, -11.9725, 0) (63.1753, 25, 0) (55.4285, 61.9725, 0) (35.6407, 54.7546, 0) (22.1945, 47.235, 0) (12.9237, 54.4962, 0) (-7.8314, 60.5326, 0) (-6.1408, 36.4737, 0) (0.1923, 24.7916, 0) (-6.1283, 13.3987, 0) (-7.8994, -10.4816, 0) (12.9237, -4.4962, 0) (22.1945, 2.765, 0) (35.6407, -4.7546, 0)
equation "d156 = Print6mmOD"
equation "d178 = ( 75 / 2 ) * 1 mm"
equation "d198 = ( 75 / 2 ) * 1 mm"
equation "d9 = Print6mmOD"
equation "Print6mmOD = 6.25 mm" comment "3D Printing"
